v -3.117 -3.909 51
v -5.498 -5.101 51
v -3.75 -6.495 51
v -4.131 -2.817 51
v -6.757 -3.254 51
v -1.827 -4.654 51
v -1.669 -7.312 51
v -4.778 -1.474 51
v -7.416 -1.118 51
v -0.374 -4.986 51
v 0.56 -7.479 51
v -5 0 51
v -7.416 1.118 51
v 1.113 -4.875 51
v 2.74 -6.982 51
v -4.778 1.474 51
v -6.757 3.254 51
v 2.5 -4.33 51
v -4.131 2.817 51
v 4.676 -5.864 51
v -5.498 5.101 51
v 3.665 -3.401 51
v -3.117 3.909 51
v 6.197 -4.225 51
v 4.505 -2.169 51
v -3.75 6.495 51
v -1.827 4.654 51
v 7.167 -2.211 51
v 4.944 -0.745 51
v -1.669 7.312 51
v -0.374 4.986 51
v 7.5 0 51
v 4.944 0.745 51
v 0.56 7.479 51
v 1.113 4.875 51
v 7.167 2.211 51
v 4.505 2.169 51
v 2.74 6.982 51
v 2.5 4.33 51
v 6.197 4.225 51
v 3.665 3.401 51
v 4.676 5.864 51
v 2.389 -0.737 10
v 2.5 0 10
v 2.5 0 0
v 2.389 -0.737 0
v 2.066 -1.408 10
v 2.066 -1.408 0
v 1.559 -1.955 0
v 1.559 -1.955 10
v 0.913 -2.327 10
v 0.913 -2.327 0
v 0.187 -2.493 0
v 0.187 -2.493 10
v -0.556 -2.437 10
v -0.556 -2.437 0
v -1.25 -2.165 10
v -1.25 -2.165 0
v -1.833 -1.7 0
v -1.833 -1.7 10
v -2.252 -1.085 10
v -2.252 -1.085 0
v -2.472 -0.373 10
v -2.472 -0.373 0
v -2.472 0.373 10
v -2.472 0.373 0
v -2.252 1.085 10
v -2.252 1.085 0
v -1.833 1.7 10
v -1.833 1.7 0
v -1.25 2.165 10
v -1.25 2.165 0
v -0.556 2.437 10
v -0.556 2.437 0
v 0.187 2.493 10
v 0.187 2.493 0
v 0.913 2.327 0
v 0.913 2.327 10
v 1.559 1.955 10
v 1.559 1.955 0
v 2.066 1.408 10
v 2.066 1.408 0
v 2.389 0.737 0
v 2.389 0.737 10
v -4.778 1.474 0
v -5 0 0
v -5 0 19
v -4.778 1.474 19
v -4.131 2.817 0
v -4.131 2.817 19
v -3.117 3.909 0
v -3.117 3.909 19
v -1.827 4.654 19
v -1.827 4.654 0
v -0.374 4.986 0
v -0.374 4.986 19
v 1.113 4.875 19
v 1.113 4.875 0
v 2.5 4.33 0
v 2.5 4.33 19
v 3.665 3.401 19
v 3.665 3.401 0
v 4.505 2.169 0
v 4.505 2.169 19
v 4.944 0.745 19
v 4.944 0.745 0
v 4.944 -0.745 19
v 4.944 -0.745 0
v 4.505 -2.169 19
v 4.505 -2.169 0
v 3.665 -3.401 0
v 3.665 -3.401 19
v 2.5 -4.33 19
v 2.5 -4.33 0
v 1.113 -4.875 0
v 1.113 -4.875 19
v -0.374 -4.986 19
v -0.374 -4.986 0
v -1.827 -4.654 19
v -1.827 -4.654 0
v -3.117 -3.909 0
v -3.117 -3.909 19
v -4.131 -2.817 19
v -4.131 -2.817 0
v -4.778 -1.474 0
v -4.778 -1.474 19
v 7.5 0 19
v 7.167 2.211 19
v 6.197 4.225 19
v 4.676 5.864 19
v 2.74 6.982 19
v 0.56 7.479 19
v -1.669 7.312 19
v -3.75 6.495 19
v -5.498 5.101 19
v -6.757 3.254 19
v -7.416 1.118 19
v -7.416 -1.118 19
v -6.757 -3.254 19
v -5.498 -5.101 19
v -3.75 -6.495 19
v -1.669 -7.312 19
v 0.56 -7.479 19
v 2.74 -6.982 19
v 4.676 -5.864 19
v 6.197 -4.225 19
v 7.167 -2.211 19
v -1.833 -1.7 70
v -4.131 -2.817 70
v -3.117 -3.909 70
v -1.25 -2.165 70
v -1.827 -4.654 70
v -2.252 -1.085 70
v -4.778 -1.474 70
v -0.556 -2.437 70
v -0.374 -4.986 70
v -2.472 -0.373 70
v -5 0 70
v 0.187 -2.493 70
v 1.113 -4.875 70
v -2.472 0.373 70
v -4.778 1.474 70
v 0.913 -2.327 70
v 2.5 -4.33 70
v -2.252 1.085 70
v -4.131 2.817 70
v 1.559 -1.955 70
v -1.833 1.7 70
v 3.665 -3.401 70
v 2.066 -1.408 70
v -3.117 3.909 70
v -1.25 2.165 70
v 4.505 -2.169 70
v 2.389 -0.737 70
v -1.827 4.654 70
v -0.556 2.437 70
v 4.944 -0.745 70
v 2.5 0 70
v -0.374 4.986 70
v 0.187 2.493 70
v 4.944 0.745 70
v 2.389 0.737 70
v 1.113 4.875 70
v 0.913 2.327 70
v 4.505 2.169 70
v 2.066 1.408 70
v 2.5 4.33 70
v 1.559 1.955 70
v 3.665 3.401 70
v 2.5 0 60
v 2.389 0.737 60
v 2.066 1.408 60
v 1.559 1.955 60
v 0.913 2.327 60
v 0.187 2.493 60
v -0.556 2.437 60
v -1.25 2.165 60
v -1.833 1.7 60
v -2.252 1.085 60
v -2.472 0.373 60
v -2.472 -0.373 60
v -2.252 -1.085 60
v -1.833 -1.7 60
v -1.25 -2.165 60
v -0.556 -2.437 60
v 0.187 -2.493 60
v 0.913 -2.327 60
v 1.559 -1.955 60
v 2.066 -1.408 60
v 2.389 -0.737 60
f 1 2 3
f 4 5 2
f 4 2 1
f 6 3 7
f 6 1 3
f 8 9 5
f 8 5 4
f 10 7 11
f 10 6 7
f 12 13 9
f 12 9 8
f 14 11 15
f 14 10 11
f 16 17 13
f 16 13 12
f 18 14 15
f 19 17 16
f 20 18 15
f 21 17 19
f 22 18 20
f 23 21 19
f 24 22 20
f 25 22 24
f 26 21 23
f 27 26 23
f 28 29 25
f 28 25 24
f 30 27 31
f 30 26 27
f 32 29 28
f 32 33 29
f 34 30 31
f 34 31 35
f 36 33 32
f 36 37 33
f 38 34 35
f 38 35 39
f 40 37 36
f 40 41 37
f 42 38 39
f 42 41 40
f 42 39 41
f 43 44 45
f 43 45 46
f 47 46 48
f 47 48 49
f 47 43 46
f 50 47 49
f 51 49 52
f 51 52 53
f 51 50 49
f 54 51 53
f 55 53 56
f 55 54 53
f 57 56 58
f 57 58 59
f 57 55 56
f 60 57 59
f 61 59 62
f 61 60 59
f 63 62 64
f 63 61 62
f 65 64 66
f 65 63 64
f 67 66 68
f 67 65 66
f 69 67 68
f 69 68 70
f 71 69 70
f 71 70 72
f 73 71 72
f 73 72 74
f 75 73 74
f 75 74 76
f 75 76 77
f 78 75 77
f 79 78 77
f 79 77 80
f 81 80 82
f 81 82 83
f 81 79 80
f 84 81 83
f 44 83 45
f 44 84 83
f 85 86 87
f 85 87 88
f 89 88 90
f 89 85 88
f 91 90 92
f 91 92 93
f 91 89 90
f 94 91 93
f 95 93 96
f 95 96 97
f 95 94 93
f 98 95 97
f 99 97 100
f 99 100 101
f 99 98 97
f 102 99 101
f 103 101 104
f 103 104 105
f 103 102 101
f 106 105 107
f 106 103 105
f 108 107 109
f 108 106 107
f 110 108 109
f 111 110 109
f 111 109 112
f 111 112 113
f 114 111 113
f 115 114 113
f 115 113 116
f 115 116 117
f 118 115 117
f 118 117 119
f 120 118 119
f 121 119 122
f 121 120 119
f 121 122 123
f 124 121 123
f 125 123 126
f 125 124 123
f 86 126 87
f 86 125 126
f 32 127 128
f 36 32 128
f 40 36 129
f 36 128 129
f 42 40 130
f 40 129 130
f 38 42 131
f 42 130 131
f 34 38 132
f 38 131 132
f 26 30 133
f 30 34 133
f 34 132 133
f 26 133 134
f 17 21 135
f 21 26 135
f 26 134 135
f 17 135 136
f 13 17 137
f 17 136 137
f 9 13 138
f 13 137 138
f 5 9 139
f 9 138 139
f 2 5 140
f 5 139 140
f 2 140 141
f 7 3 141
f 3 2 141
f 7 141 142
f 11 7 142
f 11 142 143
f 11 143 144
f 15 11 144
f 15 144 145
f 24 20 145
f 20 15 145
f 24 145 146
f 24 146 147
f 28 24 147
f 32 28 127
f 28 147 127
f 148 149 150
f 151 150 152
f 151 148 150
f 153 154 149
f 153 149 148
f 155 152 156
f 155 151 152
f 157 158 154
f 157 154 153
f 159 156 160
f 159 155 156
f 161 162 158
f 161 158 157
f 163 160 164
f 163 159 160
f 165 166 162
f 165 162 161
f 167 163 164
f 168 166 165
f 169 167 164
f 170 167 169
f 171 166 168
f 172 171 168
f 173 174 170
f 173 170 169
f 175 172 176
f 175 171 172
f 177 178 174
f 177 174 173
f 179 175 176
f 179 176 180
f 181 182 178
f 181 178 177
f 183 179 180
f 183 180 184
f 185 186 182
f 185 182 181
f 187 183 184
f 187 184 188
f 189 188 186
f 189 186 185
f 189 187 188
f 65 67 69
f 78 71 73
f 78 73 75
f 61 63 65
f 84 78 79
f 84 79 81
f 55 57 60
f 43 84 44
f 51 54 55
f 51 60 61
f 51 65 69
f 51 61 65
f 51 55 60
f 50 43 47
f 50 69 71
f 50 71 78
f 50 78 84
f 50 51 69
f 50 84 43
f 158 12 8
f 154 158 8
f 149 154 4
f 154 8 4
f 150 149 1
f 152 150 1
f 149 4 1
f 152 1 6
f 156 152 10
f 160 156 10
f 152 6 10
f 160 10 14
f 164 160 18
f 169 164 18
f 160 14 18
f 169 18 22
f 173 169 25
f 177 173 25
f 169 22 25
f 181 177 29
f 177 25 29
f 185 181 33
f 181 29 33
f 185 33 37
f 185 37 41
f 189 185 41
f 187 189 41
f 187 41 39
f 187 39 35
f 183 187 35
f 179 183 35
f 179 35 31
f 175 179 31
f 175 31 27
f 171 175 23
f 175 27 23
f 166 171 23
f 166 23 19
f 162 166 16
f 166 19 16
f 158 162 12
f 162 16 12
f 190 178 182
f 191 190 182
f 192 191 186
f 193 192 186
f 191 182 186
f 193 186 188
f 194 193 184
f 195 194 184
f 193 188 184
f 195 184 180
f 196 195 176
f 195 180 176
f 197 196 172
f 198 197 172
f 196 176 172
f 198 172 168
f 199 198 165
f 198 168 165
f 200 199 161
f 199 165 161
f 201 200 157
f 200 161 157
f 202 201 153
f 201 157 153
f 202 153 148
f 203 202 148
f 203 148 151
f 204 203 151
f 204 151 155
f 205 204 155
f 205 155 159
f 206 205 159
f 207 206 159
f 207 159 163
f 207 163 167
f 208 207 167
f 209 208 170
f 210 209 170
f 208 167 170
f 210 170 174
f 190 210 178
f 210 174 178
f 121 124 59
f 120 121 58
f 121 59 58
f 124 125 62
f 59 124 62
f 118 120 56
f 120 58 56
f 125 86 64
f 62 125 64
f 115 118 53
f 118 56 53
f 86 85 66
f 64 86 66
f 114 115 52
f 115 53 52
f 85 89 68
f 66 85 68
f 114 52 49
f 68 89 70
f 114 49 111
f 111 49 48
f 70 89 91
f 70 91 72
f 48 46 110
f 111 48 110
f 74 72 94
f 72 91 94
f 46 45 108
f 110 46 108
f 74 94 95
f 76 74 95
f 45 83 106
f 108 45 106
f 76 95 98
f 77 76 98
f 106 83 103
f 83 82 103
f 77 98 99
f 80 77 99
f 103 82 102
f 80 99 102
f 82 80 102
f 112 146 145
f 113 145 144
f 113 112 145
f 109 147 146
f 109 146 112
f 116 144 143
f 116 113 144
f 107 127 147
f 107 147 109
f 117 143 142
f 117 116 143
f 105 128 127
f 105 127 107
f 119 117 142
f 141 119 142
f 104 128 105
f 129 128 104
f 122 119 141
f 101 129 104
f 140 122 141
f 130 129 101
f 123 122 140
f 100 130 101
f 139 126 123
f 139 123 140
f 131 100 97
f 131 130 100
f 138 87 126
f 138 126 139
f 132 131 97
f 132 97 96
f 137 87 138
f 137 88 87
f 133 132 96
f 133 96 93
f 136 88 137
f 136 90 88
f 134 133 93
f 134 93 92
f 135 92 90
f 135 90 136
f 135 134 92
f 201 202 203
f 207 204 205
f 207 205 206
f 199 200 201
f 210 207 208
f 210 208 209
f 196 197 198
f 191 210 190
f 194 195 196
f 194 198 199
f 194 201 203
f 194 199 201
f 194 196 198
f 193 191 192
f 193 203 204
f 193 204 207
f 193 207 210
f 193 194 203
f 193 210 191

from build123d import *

# Parameters (mm, degrees)
SKETCH1_R           = 7.5
BOSS_EXTRUDE1_DEPTH = 70
SKETCH2_R           = 10.194447781
SKETCH2_R_2         = 5
CUT_EXTRUDE1_DEPTH  = 19
CUT_EXTRUDE2_START  = -19
SKETCH3_R           = 9.951910859
SKETCH3_R_2         = 5
CUT_EXTRUDE2_DEPTH  = 19
SKETCH4_R           = 2.5
CUT_EXTRUDE3_DEPTH  = 10
CUT_EXTRUDE4_START  = -10
SKETCH5_R           = 2.5
CUT_EXTRUDE4_DEPTH  = 10


with BuildPart() as part:
    # Sketch1 → Boss-Extrude1 (new body)
    with BuildSketch(Plane.XY):
        Circle(SKETCH1_R)
    extrude(amount=BOSS_EXTRUDE1_DEPTH)

    # Sketch2 → Cut-Extrude1 (cut)
    with BuildSketch(Plane(origin=(0, 0, 0), x_dir=(-1, 0, 0), z_dir=(0, 0, -1))):
        Circle(SKETCH2_R)
        Circle(SKETCH2_R_2, mode=Mode.SUBTRACT)
    extrude(amount=-CUT_EXTRUDE1_DEPTH, mode=Mode.SUBTRACT)

    # Sketch3 → Cut-Extrude2 (cut)
    with BuildSketch(Plane.XY.offset(70).offset(CUT_EXTRUDE2_START)):
        Circle(SKETCH3_R)
        with Locations(Location((0, 0, 0), (0, 0, 180))):
            Circle(SKETCH3_R_2, mode=Mode.SUBTRACT)
    extrude(amount=CUT_EXTRUDE2_DEPTH, mode=Mode.SUBTRACT)

    # Sketch4 → Cut-Extrude3 (cut)
    with BuildSketch(Plane.XY.offset(70)):
        Circle(SKETCH4_R)
    extrude(amount=-CUT_EXTRUDE3_DEPTH, mode=Mode.SUBTRACT)

    # Sketch5 → Cut-Extrude4 (cut)
    with BuildSketch(Plane(origin=(0, 0, 0), x_dir=(-1, 0, 0), z_dir=(0, 0, -1)).offset(CUT_EXTRUDE4_START)):
        with Locations(Location((0, 0, 0), (0, 0, 180))):
            Circle(SKETCH5_R)
    extrude(amount=CUT_EXTRUDE4_DEPTH, mode=Mode.SUBTRACT)


solid = part.part
